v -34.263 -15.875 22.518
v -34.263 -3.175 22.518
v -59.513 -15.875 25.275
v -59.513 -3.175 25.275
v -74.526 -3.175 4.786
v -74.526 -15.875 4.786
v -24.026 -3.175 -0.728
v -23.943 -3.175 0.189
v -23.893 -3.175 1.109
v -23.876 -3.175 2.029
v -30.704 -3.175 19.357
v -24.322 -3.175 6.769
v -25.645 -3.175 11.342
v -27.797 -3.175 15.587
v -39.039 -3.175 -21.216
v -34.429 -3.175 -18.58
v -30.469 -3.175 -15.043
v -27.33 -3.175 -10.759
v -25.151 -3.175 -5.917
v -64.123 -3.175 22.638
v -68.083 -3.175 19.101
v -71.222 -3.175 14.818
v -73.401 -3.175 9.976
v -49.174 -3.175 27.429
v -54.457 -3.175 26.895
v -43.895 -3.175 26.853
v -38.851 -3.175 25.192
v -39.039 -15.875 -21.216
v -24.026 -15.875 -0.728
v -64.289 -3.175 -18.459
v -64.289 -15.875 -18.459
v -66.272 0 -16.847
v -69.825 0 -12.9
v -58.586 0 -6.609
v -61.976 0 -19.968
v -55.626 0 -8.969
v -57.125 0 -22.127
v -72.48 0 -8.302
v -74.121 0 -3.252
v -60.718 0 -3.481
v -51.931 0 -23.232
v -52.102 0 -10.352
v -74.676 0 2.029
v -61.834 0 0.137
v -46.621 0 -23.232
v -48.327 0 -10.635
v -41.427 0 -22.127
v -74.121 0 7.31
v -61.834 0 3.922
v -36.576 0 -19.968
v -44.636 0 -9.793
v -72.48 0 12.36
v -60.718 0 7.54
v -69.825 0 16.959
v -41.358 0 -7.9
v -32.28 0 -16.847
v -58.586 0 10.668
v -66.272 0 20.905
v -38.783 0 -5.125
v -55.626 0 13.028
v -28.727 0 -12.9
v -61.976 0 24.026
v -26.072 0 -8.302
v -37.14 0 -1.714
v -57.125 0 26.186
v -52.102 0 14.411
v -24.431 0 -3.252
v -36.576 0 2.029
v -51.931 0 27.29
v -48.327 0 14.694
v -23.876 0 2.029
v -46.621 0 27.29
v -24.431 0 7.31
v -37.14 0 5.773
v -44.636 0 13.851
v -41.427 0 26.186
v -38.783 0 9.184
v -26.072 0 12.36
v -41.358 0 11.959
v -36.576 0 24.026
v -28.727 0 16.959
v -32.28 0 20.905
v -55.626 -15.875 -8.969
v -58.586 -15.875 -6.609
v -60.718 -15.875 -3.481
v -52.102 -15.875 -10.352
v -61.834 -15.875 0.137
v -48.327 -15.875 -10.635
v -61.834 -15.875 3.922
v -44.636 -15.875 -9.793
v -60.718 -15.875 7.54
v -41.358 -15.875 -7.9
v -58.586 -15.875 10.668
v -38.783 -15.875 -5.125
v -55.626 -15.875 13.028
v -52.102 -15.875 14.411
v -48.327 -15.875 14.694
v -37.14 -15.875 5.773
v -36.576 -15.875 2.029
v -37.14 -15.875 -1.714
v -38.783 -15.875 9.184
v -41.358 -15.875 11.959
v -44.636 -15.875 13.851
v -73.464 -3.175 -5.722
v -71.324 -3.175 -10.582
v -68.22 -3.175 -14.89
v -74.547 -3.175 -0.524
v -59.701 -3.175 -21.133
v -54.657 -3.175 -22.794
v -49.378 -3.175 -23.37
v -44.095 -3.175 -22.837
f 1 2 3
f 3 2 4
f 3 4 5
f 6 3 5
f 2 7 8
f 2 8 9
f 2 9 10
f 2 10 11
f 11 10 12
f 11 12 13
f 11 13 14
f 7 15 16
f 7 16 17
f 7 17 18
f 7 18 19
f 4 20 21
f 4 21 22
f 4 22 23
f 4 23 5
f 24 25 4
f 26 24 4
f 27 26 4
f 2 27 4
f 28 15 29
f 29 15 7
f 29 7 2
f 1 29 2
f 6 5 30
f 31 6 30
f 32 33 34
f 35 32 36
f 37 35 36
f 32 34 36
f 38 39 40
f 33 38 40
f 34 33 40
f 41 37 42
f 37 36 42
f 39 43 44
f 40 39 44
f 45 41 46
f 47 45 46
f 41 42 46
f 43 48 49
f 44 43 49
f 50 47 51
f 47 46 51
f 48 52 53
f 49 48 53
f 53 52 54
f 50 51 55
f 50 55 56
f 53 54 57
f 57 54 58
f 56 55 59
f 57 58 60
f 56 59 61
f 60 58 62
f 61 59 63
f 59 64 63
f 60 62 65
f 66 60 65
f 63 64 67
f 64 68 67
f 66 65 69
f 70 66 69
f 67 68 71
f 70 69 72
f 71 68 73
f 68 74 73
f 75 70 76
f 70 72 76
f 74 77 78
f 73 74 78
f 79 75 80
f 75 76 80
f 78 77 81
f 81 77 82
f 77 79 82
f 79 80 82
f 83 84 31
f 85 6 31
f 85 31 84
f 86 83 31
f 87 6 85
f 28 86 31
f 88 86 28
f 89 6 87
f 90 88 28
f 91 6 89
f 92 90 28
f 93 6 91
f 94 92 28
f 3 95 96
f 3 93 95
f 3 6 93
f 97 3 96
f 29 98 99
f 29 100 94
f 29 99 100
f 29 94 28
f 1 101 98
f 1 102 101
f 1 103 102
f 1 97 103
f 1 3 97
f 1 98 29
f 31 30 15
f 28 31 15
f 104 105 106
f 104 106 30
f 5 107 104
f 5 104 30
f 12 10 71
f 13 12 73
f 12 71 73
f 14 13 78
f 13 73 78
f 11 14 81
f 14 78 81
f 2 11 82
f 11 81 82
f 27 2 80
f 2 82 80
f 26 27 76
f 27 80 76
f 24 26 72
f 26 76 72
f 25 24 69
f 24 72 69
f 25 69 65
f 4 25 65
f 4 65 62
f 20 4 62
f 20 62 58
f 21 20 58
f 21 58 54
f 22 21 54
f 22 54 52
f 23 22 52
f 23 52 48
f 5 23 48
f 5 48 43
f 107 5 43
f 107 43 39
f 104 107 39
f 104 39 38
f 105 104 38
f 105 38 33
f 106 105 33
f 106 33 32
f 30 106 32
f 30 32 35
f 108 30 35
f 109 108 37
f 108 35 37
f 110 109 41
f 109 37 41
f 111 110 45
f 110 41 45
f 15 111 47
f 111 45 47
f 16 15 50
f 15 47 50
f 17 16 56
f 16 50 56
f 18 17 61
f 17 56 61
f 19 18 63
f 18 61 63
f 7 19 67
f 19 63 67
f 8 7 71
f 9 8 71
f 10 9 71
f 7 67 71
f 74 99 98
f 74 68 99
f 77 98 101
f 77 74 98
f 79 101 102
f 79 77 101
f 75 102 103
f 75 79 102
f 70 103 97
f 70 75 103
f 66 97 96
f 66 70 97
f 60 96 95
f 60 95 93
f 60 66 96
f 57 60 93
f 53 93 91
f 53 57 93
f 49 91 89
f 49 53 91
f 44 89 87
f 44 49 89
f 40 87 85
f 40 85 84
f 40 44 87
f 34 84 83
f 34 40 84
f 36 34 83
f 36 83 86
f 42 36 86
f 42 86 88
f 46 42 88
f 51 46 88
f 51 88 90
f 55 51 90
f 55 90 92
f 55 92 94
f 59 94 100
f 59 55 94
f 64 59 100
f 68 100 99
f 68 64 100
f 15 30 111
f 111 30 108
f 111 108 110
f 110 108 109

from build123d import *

# Parameters (mm, degrees)
F0_R     = 25.4
F0_R_2   = 12.7
F1_DEPTH = 3.175
F2_R     = 12.7
F3_DEPTH = 12.7


with BuildPart() as f1:
    # F0 (on Front) → F1 (new body)
    with BuildSketch(Plane.XZ):
        with Locations((-49.276002, 2.029355)):
            Circle(F0_R)
        with Locations((-49.276002, 2.029355)):
            Circle(F0_R_2, mode=Mode.SUBTRACT)
    extrude(amount=F1_DEPTH)

    # F2 (on face) → F3 (join)
    with BuildSketch(Plane.XZ.offset(3.175)):
        Polygon((-39.038599, -21.216195), (-24.026064, -0.727569), (-34.263467, 22.517981), (-59.513405, 25.274904), (-74.52594, 4.786278), (-64.288537, -18.459271), align=None)
        with Locations((-49.276002, 2.029355)):
            Circle(F2_R, mode=Mode.SUBTRACT)
    extrude(amount=F3_DEPTH)


solid = f1.part
